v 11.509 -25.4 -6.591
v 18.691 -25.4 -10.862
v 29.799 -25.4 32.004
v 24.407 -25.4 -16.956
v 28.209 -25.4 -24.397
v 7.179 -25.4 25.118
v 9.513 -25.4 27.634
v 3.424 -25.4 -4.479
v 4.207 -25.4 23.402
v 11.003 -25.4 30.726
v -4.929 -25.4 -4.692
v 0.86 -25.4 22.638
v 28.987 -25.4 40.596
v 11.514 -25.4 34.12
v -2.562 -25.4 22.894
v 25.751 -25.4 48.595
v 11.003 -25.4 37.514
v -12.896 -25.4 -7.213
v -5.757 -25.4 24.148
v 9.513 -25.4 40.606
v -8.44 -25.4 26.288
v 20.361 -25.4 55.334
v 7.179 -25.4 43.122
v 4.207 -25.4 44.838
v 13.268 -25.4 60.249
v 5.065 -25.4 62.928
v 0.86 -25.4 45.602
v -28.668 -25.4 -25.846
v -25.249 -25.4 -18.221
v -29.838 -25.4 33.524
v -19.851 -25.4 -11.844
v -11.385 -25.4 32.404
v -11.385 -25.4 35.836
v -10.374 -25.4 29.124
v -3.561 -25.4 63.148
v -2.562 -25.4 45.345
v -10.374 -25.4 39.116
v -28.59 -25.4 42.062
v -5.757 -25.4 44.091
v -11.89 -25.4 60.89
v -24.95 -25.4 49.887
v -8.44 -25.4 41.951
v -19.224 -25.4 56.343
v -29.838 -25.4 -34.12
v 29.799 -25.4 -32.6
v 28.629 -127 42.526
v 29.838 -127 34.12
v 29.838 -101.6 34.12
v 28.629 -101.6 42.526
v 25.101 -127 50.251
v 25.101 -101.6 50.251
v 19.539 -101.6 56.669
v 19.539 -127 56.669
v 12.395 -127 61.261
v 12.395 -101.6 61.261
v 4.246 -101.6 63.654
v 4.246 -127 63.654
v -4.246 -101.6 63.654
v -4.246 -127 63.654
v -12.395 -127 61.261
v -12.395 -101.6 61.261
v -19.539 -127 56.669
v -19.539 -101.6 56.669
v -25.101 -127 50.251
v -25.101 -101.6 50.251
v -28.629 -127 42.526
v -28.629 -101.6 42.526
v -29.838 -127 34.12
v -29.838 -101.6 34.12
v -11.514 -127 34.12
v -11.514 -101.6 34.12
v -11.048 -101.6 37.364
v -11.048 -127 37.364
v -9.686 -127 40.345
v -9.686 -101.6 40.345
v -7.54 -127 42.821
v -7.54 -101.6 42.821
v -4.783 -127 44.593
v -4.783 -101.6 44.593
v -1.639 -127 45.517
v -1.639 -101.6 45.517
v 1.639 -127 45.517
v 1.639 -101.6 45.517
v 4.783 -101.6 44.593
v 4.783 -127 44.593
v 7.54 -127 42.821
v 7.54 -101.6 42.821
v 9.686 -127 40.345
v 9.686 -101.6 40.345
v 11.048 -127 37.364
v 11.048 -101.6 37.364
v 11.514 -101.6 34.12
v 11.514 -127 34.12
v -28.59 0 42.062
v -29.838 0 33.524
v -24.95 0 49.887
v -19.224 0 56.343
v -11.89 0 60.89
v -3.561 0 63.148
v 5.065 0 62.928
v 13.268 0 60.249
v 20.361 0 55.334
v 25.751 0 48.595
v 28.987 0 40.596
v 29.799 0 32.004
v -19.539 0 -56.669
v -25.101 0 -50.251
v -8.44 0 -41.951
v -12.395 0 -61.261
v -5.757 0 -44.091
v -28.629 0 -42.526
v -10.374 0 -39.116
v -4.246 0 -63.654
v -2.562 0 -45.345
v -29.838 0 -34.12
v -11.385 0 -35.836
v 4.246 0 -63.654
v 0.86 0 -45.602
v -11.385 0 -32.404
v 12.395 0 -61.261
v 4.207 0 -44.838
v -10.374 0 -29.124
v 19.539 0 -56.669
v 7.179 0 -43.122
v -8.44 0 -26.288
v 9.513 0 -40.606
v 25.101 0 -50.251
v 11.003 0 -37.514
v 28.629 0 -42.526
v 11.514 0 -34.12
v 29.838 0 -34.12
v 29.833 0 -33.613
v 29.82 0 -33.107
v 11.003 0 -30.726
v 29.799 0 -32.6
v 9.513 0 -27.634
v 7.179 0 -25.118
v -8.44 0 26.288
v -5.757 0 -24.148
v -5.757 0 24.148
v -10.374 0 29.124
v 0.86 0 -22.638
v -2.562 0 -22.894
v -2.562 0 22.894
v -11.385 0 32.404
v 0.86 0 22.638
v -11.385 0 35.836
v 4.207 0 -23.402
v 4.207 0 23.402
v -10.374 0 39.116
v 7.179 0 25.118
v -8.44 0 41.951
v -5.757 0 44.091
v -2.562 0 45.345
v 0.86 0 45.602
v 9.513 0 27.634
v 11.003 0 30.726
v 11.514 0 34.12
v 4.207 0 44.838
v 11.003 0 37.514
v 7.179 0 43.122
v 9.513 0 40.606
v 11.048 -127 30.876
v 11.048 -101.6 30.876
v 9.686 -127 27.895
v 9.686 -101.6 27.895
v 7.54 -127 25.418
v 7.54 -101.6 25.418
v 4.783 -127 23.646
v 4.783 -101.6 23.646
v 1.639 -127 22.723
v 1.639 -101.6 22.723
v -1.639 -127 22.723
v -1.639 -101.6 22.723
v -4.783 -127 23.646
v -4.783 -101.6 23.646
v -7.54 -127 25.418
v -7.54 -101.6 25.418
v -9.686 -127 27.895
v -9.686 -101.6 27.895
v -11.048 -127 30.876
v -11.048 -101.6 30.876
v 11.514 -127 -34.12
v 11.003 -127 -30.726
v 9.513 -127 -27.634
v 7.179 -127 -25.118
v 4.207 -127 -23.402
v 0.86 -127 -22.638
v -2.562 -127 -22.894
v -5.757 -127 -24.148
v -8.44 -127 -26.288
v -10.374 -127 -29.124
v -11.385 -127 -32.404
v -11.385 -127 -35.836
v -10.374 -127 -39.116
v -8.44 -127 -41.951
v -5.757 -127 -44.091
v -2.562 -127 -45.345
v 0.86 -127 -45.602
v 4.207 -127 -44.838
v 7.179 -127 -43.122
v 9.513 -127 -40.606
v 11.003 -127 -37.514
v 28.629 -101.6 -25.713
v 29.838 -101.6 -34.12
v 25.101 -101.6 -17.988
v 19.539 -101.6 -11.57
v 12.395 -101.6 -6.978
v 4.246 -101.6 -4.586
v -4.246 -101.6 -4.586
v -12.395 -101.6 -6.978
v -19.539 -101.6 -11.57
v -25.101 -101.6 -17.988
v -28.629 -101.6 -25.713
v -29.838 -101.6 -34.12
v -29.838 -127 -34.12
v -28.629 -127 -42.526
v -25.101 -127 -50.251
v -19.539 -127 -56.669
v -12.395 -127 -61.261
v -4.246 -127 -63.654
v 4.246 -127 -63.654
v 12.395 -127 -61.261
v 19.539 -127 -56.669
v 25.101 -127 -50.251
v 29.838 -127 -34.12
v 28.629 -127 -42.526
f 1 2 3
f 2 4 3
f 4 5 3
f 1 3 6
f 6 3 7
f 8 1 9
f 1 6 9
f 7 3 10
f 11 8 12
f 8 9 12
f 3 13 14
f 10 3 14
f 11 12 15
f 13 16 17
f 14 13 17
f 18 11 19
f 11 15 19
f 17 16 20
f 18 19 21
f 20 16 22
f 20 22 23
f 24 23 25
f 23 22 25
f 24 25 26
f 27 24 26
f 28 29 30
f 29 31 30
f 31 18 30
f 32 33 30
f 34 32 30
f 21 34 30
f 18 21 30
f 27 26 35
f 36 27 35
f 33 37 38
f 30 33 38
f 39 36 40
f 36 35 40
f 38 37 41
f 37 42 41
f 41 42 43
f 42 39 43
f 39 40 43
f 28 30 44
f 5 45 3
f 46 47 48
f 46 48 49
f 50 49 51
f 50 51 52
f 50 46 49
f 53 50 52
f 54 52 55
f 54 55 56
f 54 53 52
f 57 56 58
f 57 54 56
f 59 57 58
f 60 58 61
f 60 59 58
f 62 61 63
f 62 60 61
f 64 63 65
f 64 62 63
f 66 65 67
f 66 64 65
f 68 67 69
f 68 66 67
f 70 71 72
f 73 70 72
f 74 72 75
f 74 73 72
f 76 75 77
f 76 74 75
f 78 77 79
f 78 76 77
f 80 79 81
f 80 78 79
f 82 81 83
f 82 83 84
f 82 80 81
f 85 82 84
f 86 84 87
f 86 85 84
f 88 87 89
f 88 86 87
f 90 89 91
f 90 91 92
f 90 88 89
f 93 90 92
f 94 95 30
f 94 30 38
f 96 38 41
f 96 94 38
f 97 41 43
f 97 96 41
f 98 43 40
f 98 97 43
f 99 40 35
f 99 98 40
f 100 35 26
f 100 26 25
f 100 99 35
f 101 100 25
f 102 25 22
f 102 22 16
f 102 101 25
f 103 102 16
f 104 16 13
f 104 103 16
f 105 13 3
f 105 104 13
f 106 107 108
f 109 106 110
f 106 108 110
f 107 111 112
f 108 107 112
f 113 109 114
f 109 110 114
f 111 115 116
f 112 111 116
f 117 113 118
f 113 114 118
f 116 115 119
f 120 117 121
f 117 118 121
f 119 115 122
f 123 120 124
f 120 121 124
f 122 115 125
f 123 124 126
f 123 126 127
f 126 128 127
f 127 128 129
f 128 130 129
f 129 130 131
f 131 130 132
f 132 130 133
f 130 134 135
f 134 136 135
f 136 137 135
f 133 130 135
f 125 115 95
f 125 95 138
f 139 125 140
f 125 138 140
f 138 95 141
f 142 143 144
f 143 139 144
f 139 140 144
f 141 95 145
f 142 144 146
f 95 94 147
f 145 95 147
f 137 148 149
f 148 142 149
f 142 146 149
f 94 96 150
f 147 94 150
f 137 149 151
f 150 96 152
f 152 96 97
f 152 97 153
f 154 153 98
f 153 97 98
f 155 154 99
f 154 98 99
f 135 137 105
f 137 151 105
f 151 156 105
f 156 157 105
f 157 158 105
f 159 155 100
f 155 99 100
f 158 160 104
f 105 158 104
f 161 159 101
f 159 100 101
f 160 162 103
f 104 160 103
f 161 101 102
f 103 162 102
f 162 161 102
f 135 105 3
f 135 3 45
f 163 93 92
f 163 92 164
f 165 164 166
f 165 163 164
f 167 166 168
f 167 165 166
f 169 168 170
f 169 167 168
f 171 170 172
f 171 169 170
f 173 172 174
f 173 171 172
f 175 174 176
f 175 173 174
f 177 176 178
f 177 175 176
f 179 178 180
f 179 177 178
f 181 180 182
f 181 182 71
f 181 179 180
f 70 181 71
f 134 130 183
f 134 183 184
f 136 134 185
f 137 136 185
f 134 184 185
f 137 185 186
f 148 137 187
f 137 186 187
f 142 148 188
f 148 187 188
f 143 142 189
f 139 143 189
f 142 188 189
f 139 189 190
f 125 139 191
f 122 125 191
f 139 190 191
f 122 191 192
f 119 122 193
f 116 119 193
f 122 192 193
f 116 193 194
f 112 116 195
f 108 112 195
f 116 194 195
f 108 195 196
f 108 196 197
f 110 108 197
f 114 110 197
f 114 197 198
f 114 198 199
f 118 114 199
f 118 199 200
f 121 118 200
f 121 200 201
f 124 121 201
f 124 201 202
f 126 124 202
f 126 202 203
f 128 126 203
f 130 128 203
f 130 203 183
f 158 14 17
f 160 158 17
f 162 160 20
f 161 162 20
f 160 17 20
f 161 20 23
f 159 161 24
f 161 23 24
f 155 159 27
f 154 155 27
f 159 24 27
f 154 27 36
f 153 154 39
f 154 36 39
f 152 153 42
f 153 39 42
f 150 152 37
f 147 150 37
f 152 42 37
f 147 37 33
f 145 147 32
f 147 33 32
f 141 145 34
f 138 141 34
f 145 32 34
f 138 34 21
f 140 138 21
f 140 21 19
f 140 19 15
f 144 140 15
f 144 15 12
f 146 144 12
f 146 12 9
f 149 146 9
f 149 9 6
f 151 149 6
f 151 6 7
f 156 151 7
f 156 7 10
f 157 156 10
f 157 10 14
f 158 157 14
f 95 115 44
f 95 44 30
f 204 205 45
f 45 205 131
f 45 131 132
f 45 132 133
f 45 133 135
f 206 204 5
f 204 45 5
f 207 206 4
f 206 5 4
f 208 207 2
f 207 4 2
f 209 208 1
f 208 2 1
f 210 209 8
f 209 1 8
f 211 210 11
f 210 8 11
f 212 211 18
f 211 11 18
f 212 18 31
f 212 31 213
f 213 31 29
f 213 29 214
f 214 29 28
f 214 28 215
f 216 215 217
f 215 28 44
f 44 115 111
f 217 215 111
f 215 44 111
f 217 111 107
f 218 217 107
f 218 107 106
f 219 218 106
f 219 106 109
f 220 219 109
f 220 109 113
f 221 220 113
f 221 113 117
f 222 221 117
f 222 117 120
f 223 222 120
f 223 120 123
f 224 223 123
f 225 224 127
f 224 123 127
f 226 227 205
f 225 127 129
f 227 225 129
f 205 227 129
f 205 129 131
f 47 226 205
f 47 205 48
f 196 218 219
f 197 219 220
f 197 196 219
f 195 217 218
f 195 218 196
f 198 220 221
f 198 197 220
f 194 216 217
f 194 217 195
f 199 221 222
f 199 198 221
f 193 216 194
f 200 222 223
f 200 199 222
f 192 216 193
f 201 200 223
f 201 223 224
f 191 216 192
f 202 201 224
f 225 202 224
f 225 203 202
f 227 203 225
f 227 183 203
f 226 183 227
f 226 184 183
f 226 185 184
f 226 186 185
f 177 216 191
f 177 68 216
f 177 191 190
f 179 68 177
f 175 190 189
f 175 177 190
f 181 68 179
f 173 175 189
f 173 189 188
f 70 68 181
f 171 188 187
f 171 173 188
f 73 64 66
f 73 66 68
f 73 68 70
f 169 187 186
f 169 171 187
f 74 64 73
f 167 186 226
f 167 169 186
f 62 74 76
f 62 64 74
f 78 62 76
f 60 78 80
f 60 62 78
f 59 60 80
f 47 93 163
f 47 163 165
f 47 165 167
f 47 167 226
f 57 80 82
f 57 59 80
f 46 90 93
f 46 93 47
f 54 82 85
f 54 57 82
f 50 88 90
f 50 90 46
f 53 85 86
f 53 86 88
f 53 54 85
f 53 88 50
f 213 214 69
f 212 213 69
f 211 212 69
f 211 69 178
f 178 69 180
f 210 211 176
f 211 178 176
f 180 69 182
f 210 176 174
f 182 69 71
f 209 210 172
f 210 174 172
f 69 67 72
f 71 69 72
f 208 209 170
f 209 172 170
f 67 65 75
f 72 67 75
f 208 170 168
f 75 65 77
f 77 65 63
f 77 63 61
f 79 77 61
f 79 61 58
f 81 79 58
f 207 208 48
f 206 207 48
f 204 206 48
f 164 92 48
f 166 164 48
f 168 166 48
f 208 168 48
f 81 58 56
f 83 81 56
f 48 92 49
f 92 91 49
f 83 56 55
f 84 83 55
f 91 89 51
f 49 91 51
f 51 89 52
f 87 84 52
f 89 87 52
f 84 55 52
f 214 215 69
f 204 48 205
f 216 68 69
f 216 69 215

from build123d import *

# Parameters (mm, degrees)
F0_R     = 29.837596
F1_DEPTH = 127
F3_DEPTH = 25.4
F5_DEPTH = 25.4
F6_R     = 11.514098
F7_DEPTH = 249.174


with BuildPart() as f1:
    # F0 (on Front) → F1 (new body)
    with BuildSketch(Plane.XZ):
        with Locations((0, -34.119722)):
            Circle(F0_R)
    extrude(amount=F1_DEPTH)

    # F2 (on face) → F3 (join)
    with BuildSketch(Plane.XZ.offset(127)):
        with BuildLine():
            Line((-11.514098, -34.119722), (0, -34.119722))
            Line((0, -34.119722), (11.514098, -34.119722))
            ThreePointArc((11.514098, -34.119722), (0, -22.605623), (-11.514098, -34.119722))
        make_face()
        with BuildLine():
            Line((-29.837596, -34.119722), (-11.514098, -34.119722))
            ThreePointArc((-11.514098, -34.119722), (0, -22.605623), (11.514098, -34.119722))
            Line((11.514098, -34.119722), (29.837596, -34.119722))
            ThreePointArc((29.837596, -34.119722), (0, -4.282125), (-29.837596, -34.119722))
        make_face()
        with BuildLine():
            Line((-29.837596, 34.119722), (-29.837596, -34.119722))
            ThreePointArc((-29.837596, -34.119722), (0, -4.282125), (29.837596, -34.119722))
            Line((29.837596, -34.119722), (29.837596, 34.119722))
            ThreePointArc((29.837596, 34.119722), (0, 63.957318), (-29.837596, 34.119722))
        make_face()
        with BuildLine():
            ThreePointArc((11.514098, 34.119722), (0, 22.605623), (-11.514098, 34.119722))
            ThreePointArc((-11.514098, 34.119722), (0, 45.63382), (11.514098, 34.119722))
        make_face(mode=Mode.SUBTRACT)
    extrude(amount=-F3_DEPTH)

    # F4 (on face) → F5 (join)
    with BuildSketch(Plane(origin=(0, 0, 0), x_dir=(-1, 0, 0), z_dir=(0, 1, 0))):
        with BuildLine():
            Line((-29.798884, -34.119722), (0, -34.119722))
            Line((0, -34.119722), (29.416961, -34.119722))
            Line((29.416961, -34.119722), (29.837596, -34.119722))
            Line((29.837596, -34.119722), (29.837596, -29.127271))
            Line((29.837596, -29.127271), (29.837596, 33.523746))
            ThreePointArc((29.837596, 33.523746), (-0.759963, 63.351663), (-29.798884, 32.004312))
            Line((-29.798884, 32.004312), (-29.798884, -34.119722))
        make_face()
    extrude(amount=-F5_DEPTH)

    # F6 (on face) → F7 (cut)
    with BuildSketch(Plane.XZ.offset(127)):
        with Locations((0, 34.119722)):
            Circle(F6_R)
        with Locations((0, -34.119722)):
            Circle(F6_R)
    extrude(amount=-F7_DEPTH, mode=Mode.SUBTRACT)


solid = f1.part
